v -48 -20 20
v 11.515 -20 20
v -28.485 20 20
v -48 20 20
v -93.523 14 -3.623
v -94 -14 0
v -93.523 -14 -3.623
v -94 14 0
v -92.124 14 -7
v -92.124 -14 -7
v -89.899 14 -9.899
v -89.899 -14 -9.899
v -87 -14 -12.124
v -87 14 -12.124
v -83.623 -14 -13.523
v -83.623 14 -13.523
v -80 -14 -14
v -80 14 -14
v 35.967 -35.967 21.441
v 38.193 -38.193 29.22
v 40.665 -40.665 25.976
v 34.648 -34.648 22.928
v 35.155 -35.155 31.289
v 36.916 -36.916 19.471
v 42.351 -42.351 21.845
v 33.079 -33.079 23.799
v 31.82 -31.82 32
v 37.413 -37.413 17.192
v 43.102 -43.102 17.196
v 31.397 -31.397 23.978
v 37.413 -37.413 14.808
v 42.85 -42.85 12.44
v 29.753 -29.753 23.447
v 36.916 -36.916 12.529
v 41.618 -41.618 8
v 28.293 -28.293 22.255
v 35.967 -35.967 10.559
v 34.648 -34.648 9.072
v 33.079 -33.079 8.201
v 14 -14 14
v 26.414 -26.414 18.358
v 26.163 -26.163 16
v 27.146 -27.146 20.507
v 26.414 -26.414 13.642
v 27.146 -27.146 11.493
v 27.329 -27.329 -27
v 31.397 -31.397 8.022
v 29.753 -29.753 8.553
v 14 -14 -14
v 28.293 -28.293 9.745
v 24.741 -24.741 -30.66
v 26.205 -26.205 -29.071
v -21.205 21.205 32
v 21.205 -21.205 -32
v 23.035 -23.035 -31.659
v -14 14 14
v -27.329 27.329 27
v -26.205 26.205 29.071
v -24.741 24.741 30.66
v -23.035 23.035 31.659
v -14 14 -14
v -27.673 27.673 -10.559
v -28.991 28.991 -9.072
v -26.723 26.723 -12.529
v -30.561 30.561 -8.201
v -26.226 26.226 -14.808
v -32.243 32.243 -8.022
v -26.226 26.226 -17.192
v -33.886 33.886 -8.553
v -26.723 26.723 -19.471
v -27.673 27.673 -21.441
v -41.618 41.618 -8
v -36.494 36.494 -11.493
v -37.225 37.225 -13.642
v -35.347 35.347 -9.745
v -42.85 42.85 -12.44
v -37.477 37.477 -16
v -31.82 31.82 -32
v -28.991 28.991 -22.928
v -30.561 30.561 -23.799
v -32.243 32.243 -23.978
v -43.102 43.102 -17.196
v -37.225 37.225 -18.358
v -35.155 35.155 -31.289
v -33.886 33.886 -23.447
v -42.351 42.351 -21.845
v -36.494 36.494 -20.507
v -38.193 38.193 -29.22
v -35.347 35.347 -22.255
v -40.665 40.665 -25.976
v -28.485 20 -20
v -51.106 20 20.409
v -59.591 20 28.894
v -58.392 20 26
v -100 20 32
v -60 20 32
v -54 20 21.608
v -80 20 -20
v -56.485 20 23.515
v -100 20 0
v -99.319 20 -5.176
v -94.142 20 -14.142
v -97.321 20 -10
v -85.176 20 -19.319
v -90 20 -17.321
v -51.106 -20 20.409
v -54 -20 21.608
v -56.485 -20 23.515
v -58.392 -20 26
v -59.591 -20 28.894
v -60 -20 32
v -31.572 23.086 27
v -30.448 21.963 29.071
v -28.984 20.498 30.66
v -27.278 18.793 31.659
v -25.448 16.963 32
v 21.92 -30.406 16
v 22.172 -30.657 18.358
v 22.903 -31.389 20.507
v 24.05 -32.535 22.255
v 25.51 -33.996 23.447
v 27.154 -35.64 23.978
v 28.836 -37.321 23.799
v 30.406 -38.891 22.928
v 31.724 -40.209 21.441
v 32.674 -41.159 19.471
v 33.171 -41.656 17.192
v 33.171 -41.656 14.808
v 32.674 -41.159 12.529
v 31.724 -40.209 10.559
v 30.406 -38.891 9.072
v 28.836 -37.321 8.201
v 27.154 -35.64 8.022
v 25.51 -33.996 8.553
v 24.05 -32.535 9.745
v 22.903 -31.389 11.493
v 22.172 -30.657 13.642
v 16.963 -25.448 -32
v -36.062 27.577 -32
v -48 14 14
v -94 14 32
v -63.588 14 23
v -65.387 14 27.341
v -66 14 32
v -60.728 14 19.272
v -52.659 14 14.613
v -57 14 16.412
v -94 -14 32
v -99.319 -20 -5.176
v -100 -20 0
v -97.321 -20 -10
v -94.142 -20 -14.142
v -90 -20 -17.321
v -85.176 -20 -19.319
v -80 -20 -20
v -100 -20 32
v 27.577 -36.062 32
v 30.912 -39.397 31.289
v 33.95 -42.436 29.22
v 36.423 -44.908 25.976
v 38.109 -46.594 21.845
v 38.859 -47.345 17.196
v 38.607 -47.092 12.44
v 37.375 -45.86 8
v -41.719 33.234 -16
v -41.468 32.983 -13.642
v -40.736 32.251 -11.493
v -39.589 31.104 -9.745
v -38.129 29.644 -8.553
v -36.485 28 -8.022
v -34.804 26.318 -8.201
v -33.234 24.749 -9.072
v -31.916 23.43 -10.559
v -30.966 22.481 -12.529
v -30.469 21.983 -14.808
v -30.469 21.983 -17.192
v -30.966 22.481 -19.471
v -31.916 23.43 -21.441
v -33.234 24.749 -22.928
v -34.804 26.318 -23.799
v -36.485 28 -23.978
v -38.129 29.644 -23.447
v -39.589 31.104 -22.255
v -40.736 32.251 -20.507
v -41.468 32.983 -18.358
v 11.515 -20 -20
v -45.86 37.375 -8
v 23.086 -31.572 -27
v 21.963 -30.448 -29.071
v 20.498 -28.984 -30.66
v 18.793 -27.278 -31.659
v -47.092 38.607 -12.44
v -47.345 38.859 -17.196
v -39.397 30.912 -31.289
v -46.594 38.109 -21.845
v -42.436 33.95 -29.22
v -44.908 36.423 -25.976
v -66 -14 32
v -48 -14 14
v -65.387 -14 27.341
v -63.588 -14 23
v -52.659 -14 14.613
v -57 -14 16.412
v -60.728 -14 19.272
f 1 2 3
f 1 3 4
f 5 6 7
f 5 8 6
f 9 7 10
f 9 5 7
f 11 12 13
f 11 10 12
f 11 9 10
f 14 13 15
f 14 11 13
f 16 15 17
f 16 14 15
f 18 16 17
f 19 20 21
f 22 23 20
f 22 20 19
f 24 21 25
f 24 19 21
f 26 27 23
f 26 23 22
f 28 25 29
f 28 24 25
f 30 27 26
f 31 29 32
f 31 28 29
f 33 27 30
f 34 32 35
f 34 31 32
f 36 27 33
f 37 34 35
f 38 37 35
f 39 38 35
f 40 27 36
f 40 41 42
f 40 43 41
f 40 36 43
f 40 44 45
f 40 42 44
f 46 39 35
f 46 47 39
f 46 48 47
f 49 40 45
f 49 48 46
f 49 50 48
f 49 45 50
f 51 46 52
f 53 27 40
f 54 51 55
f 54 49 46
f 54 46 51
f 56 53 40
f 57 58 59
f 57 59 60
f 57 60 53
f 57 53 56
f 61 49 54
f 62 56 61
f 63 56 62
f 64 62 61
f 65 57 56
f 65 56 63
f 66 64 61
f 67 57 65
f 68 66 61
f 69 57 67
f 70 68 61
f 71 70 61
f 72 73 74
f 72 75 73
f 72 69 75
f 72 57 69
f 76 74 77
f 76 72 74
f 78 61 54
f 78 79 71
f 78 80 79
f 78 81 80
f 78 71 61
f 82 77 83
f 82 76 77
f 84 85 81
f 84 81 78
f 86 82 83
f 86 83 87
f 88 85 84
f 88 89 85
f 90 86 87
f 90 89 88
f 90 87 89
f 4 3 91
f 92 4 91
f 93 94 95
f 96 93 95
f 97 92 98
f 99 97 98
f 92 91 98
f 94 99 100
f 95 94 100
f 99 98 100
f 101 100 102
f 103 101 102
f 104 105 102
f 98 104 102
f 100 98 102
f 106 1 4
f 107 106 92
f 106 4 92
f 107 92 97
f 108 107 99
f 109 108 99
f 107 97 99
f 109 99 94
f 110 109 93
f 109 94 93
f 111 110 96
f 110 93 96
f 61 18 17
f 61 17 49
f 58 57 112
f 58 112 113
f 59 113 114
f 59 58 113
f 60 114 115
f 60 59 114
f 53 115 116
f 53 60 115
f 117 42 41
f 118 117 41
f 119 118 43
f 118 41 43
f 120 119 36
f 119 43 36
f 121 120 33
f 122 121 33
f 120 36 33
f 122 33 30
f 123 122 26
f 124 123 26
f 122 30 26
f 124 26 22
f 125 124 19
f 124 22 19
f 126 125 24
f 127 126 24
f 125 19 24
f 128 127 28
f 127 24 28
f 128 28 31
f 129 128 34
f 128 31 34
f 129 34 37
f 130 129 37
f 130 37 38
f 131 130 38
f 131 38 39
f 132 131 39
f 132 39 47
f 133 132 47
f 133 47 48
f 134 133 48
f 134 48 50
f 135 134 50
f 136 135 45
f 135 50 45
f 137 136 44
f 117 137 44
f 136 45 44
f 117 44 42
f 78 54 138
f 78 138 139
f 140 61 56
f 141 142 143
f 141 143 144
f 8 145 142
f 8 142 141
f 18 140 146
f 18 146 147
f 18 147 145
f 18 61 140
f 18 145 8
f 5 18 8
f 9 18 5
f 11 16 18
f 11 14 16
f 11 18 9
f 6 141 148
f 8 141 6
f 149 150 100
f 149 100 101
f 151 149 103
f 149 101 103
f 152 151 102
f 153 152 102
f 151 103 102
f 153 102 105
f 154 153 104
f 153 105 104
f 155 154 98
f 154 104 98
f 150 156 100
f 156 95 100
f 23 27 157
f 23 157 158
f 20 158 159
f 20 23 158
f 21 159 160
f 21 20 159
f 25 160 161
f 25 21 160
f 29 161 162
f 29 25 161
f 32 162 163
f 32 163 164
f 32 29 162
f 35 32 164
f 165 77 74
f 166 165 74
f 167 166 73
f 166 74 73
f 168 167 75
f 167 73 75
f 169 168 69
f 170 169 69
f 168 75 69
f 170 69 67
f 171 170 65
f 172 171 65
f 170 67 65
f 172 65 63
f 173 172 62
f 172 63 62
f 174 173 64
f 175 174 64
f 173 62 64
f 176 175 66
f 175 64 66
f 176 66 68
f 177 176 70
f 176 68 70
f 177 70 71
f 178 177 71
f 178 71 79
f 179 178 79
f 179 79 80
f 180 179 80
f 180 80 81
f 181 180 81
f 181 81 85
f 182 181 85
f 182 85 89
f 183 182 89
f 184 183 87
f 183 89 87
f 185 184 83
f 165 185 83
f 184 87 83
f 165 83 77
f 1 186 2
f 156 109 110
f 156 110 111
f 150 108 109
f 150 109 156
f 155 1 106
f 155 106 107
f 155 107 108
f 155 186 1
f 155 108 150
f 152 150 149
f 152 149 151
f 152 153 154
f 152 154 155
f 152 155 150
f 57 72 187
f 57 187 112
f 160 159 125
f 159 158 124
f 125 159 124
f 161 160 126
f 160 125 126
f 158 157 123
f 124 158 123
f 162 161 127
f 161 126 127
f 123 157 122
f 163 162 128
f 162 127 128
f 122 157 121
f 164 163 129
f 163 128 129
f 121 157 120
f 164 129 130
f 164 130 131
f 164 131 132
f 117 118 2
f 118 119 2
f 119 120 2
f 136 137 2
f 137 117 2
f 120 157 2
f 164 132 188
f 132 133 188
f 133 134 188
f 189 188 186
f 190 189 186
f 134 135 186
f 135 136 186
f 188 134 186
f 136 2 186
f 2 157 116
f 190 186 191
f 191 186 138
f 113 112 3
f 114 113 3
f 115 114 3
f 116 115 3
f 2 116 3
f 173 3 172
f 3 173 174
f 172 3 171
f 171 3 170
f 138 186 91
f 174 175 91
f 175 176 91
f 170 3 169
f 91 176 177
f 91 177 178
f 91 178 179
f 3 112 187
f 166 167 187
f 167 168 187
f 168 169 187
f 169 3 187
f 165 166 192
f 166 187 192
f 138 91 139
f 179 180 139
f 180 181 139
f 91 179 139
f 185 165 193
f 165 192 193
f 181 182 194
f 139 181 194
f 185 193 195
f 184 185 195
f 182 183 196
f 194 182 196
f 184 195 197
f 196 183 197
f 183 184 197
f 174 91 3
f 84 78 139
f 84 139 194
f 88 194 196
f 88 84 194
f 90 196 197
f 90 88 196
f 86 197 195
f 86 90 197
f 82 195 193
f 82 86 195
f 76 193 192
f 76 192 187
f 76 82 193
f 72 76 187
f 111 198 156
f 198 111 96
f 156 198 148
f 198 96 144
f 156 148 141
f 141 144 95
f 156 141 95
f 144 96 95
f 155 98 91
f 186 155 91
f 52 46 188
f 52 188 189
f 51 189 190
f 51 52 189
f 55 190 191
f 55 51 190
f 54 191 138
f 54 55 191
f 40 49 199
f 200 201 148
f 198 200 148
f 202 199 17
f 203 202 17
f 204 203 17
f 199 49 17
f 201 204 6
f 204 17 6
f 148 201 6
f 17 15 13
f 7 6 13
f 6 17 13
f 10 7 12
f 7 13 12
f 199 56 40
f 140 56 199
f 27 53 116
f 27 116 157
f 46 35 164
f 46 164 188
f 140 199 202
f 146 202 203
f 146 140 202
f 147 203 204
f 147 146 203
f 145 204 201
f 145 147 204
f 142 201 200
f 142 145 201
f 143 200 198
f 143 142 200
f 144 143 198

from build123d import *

# Parameters (mm, degrees)
EXTRUDE_1_DEPTH          = 20
SHELL_1_T                = -6
CUT_EXTRUDE_2_DEPTH      = 110.544511501
CUT_EXTRUDE_2_DEPTH_BACK = 110.544511501
SKETCH_4_R               = 8
SKETCH_4_W               = 28
SKETCH_4_H               = 48.08326112
EXTRUDE_5_DEPTH          = 6


with BuildPart() as part:
    # 草圖1 → 伸長1 (new, symmetric)
    with BuildSketch(Plane(origin=(0, 0, 0), x_dir=(1, 0, 0), z_dir=(0, 1, 0))):
        with BuildLine():
            Line((56.455835634, -20), (-48, -20))
            ThreePointArc((-48, -20), (-56.485281374, -23.514718626), (-60, -32))
            Line((-60, -32), (-100, -32))
            Line((-100, -32), (-100, 0))
            ThreePointArc((-100, 0), (-94.142135624, 14.142135624), (-80, 20))
            Line((-80, 20), (56.455835634, 20))
            Line((56.455835634, 20), (56.455835634, -20))
        make_face()
    extrude(amount=EXTRUDE_1_DEPTH, both=True)

    # 薄殼1
    shell_1_openings = [part.faces().sort_by_distance(p)[0] for p in [
        (-80, 0, 32),
        (56.455835634, 0, 0),
    ]]
    offset(amount=SHELL_1_T, openings=shell_1_openings, kind=Kind.INTERSECTION)

    # 草圖3 → 伸長2 (cut, two sides: drawn at the far end of the back side and taken through both)
    with BuildSketch(Plane.XY.offset(20).offset(-CUT_EXTRUDE_2_DEPTH_BACK)):
        Polygon((-238.812297792, 238.812297792), (-31.748125619, 31.748125619), (31.647752007, -31.647752007), (238.711924181, -238.711924181), (652.840268527, 175.416420166), (175.316046555, 652.940642138), align=None)
    extrude(amount=CUT_EXTRUDE_2_DEPTH + CUT_EXTRUDE_2_DEPTH_BACK, mode=Mode.SUBTRACT)

    # 草圖4 → 伸長5 (add)
    with BuildSketch(Plane(origin=(0, 0, 0), x_dir=(0, 0, -1), z_dir=(0.7071067811865488, 0.7071067811865464, 0))):
        with BuildLine():
            Line((32, -29.988893001), (32, 45))
            ThreePointArc((32, 45), (24, 58.856406461), (8, 58.856406461))
            Line((8, 58.856406461), (-27, 38.649147039))
            ThreePointArc((-27, 38.649147039), (-30.660254038, 34.988893001), (-32, 29.988893001))
            Line((-32, 29.988893001), (-32, -45))
            ThreePointArc((-32, -45), (-24, -58.856406461), (-8, -58.856406461))
            Line((-8, -58.856406461), (27, -38.649147039))
            ThreePointArc((27, -38.649147039), (30.660254038, -34.988893001), (32, -29.988893001))
        make_face()
        with Locations(Location((16, 45, 0), (0, 0, 90))):
            Circle(SKETCH_4_R, mode=Mode.SUBTRACT)
        with Locations(Location((-16, -45, 0), (0, 0, 90))):
            Circle(SKETCH_4_R, mode=Mode.SUBTRACT)
        with Locations((0, 4.242640687)):
            Rectangle(SKETCH_4_W, SKETCH_4_H, mode=Mode.SUBTRACT)
    extrude(amount=-EXTRUDE_5_DEPTH)


solid = part.part
